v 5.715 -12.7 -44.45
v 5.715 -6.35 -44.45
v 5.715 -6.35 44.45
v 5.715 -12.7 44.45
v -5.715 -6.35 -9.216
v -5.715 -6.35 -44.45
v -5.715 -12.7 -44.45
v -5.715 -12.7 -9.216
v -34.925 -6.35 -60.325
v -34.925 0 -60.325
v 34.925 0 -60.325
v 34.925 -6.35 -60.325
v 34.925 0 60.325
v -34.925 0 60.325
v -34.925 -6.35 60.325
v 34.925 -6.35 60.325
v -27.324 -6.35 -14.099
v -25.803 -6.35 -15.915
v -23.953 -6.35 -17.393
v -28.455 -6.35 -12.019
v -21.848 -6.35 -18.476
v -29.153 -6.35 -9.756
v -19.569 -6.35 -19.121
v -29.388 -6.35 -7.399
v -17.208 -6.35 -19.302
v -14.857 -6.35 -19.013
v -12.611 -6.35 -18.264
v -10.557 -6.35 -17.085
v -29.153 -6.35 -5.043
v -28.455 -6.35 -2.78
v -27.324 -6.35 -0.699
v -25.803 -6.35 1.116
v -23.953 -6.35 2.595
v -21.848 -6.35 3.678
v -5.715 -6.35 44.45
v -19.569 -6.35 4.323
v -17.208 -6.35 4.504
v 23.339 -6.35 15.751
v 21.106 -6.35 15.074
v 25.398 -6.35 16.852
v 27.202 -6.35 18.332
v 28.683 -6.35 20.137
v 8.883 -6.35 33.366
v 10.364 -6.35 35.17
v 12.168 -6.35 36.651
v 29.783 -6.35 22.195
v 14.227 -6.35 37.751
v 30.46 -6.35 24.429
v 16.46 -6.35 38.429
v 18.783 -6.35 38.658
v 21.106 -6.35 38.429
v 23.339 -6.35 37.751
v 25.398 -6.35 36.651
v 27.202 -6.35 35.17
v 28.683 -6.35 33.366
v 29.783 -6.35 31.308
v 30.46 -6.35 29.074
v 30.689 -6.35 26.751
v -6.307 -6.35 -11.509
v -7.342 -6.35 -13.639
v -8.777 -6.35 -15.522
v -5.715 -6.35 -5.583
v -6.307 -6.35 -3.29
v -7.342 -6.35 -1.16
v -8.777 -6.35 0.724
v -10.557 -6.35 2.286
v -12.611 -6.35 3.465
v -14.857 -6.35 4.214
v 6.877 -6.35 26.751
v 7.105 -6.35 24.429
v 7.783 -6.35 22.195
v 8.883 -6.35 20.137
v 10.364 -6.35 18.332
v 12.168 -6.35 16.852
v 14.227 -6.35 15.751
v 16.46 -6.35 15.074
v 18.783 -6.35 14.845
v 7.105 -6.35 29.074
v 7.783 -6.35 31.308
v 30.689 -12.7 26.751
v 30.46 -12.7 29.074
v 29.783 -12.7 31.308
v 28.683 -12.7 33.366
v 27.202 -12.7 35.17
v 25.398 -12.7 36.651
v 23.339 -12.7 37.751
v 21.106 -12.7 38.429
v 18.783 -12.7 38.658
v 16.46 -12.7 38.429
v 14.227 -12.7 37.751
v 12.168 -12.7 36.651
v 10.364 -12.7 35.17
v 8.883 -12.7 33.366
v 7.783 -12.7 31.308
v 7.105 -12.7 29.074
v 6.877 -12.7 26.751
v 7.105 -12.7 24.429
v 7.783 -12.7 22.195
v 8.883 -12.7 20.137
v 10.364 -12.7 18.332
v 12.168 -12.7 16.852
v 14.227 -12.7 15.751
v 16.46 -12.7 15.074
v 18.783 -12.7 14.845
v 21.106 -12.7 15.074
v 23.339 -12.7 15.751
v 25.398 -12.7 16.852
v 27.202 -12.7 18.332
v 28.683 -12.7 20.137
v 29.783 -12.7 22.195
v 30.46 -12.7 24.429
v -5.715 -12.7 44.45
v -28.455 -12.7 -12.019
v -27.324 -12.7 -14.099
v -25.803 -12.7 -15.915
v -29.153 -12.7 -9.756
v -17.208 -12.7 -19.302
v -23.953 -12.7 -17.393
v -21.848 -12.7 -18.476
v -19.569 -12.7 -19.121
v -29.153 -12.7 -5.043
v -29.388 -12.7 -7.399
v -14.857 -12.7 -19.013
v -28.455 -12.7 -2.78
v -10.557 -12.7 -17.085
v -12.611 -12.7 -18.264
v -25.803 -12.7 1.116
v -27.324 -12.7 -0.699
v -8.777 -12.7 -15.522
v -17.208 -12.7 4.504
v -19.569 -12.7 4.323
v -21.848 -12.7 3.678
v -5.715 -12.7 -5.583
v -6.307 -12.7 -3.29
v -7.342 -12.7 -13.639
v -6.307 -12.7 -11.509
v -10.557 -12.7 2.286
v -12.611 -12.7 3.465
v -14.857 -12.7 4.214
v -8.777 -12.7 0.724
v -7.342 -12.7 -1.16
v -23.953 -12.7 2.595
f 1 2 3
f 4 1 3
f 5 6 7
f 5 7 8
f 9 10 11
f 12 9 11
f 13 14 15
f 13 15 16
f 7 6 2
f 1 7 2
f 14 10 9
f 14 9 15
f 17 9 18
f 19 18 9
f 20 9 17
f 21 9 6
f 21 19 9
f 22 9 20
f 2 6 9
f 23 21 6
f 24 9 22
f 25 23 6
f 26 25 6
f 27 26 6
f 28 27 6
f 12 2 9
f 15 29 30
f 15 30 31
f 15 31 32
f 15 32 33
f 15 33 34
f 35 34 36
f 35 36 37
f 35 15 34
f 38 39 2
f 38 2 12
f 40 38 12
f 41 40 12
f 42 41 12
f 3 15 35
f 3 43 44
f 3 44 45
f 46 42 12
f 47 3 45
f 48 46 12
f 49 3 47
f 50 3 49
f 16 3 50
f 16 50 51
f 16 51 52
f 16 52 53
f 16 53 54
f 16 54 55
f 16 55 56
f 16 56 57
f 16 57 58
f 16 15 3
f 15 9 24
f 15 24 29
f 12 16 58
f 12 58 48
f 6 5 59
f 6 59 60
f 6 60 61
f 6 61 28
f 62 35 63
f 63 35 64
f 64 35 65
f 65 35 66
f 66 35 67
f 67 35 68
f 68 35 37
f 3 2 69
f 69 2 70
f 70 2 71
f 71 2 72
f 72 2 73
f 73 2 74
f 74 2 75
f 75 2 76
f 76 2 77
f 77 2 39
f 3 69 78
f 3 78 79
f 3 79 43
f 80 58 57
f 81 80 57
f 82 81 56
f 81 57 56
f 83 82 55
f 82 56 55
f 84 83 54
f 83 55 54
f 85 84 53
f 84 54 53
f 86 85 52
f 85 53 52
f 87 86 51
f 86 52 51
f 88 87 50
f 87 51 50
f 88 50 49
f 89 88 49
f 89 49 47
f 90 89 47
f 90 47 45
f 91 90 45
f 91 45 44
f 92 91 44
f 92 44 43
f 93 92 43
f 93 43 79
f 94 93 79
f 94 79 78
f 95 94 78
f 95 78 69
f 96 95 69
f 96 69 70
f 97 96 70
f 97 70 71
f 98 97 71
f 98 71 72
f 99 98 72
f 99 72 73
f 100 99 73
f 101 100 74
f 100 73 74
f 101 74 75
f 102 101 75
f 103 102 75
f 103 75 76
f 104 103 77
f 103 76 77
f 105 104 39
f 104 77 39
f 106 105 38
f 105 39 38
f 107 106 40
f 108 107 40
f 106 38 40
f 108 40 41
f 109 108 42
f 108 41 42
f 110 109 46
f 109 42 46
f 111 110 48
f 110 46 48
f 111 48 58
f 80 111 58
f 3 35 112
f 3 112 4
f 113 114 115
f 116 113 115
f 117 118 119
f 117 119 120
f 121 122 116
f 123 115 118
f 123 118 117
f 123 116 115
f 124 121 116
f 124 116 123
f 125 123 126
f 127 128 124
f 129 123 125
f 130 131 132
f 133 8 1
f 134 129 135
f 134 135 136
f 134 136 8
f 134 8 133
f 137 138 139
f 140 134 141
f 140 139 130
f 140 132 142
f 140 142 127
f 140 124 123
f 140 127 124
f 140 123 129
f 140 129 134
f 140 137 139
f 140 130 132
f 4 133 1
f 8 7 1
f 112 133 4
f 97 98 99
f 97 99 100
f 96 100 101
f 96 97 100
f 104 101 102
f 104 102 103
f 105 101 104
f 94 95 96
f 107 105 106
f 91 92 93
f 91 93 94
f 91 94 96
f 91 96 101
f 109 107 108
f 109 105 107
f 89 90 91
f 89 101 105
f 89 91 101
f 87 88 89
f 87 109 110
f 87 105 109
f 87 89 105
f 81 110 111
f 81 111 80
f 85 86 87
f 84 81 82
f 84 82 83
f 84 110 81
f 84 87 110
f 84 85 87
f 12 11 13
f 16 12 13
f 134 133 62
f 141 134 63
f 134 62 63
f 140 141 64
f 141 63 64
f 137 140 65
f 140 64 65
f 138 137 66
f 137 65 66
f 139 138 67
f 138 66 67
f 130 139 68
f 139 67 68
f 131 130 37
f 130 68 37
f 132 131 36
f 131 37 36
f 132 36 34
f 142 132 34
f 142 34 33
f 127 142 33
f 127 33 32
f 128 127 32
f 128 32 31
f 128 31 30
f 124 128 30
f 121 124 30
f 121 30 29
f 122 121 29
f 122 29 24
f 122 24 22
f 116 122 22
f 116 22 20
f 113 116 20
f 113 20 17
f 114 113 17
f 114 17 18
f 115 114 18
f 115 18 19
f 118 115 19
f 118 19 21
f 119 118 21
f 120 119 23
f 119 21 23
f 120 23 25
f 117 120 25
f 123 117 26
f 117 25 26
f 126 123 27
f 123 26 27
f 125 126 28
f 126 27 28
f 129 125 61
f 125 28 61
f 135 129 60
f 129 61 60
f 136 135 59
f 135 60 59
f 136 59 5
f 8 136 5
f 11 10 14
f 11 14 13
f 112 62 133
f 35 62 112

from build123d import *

# Parameters (mm, degrees)
F0_W     = 69.85
F0_H     = 120.65
F0_W_2   = 9.525
F0_H_2   = 25.4
F1_DEPTH = 6.35
F3_R     = 11.90625
F4_DEPTH = 12.7
F2_R     = 11.90625
F5_DEPTH = 12.7
F6_W     = 11.43
F6_H     = 88.9
F7_DEPTH = 12.7


with BuildPart() as f1:
    # F0 (on Front) → F1 (new body)
    with BuildSketch(Plane.XZ):
        Rectangle(F0_W, F0_H)
        Rectangle(F0_W_2, F0_H_2, mode=Mode.SUBTRACT)
    extrude(amount=F1_DEPTH)

    # F3 (on Front) → F4 (join)
    with BuildSketch(Plane.XZ):
        with Locations((18.782835, 26.751311)):
            Circle(F3_R)
    extrude(amount=F4_DEPTH)

    # F2 (on Front) → F5 (join)
    with BuildSketch(Plane.XZ):
        with Locations((-17.48186, -7.399299)):
            Circle(F2_R)
    extrude(amount=F5_DEPTH)

    # F6 (on Front) → F7 (join)
    with BuildSketch(Plane.XZ):
        Rectangle(F6_W, F6_H)
    extrude(amount=F7_DEPTH)


solid = f1.part
